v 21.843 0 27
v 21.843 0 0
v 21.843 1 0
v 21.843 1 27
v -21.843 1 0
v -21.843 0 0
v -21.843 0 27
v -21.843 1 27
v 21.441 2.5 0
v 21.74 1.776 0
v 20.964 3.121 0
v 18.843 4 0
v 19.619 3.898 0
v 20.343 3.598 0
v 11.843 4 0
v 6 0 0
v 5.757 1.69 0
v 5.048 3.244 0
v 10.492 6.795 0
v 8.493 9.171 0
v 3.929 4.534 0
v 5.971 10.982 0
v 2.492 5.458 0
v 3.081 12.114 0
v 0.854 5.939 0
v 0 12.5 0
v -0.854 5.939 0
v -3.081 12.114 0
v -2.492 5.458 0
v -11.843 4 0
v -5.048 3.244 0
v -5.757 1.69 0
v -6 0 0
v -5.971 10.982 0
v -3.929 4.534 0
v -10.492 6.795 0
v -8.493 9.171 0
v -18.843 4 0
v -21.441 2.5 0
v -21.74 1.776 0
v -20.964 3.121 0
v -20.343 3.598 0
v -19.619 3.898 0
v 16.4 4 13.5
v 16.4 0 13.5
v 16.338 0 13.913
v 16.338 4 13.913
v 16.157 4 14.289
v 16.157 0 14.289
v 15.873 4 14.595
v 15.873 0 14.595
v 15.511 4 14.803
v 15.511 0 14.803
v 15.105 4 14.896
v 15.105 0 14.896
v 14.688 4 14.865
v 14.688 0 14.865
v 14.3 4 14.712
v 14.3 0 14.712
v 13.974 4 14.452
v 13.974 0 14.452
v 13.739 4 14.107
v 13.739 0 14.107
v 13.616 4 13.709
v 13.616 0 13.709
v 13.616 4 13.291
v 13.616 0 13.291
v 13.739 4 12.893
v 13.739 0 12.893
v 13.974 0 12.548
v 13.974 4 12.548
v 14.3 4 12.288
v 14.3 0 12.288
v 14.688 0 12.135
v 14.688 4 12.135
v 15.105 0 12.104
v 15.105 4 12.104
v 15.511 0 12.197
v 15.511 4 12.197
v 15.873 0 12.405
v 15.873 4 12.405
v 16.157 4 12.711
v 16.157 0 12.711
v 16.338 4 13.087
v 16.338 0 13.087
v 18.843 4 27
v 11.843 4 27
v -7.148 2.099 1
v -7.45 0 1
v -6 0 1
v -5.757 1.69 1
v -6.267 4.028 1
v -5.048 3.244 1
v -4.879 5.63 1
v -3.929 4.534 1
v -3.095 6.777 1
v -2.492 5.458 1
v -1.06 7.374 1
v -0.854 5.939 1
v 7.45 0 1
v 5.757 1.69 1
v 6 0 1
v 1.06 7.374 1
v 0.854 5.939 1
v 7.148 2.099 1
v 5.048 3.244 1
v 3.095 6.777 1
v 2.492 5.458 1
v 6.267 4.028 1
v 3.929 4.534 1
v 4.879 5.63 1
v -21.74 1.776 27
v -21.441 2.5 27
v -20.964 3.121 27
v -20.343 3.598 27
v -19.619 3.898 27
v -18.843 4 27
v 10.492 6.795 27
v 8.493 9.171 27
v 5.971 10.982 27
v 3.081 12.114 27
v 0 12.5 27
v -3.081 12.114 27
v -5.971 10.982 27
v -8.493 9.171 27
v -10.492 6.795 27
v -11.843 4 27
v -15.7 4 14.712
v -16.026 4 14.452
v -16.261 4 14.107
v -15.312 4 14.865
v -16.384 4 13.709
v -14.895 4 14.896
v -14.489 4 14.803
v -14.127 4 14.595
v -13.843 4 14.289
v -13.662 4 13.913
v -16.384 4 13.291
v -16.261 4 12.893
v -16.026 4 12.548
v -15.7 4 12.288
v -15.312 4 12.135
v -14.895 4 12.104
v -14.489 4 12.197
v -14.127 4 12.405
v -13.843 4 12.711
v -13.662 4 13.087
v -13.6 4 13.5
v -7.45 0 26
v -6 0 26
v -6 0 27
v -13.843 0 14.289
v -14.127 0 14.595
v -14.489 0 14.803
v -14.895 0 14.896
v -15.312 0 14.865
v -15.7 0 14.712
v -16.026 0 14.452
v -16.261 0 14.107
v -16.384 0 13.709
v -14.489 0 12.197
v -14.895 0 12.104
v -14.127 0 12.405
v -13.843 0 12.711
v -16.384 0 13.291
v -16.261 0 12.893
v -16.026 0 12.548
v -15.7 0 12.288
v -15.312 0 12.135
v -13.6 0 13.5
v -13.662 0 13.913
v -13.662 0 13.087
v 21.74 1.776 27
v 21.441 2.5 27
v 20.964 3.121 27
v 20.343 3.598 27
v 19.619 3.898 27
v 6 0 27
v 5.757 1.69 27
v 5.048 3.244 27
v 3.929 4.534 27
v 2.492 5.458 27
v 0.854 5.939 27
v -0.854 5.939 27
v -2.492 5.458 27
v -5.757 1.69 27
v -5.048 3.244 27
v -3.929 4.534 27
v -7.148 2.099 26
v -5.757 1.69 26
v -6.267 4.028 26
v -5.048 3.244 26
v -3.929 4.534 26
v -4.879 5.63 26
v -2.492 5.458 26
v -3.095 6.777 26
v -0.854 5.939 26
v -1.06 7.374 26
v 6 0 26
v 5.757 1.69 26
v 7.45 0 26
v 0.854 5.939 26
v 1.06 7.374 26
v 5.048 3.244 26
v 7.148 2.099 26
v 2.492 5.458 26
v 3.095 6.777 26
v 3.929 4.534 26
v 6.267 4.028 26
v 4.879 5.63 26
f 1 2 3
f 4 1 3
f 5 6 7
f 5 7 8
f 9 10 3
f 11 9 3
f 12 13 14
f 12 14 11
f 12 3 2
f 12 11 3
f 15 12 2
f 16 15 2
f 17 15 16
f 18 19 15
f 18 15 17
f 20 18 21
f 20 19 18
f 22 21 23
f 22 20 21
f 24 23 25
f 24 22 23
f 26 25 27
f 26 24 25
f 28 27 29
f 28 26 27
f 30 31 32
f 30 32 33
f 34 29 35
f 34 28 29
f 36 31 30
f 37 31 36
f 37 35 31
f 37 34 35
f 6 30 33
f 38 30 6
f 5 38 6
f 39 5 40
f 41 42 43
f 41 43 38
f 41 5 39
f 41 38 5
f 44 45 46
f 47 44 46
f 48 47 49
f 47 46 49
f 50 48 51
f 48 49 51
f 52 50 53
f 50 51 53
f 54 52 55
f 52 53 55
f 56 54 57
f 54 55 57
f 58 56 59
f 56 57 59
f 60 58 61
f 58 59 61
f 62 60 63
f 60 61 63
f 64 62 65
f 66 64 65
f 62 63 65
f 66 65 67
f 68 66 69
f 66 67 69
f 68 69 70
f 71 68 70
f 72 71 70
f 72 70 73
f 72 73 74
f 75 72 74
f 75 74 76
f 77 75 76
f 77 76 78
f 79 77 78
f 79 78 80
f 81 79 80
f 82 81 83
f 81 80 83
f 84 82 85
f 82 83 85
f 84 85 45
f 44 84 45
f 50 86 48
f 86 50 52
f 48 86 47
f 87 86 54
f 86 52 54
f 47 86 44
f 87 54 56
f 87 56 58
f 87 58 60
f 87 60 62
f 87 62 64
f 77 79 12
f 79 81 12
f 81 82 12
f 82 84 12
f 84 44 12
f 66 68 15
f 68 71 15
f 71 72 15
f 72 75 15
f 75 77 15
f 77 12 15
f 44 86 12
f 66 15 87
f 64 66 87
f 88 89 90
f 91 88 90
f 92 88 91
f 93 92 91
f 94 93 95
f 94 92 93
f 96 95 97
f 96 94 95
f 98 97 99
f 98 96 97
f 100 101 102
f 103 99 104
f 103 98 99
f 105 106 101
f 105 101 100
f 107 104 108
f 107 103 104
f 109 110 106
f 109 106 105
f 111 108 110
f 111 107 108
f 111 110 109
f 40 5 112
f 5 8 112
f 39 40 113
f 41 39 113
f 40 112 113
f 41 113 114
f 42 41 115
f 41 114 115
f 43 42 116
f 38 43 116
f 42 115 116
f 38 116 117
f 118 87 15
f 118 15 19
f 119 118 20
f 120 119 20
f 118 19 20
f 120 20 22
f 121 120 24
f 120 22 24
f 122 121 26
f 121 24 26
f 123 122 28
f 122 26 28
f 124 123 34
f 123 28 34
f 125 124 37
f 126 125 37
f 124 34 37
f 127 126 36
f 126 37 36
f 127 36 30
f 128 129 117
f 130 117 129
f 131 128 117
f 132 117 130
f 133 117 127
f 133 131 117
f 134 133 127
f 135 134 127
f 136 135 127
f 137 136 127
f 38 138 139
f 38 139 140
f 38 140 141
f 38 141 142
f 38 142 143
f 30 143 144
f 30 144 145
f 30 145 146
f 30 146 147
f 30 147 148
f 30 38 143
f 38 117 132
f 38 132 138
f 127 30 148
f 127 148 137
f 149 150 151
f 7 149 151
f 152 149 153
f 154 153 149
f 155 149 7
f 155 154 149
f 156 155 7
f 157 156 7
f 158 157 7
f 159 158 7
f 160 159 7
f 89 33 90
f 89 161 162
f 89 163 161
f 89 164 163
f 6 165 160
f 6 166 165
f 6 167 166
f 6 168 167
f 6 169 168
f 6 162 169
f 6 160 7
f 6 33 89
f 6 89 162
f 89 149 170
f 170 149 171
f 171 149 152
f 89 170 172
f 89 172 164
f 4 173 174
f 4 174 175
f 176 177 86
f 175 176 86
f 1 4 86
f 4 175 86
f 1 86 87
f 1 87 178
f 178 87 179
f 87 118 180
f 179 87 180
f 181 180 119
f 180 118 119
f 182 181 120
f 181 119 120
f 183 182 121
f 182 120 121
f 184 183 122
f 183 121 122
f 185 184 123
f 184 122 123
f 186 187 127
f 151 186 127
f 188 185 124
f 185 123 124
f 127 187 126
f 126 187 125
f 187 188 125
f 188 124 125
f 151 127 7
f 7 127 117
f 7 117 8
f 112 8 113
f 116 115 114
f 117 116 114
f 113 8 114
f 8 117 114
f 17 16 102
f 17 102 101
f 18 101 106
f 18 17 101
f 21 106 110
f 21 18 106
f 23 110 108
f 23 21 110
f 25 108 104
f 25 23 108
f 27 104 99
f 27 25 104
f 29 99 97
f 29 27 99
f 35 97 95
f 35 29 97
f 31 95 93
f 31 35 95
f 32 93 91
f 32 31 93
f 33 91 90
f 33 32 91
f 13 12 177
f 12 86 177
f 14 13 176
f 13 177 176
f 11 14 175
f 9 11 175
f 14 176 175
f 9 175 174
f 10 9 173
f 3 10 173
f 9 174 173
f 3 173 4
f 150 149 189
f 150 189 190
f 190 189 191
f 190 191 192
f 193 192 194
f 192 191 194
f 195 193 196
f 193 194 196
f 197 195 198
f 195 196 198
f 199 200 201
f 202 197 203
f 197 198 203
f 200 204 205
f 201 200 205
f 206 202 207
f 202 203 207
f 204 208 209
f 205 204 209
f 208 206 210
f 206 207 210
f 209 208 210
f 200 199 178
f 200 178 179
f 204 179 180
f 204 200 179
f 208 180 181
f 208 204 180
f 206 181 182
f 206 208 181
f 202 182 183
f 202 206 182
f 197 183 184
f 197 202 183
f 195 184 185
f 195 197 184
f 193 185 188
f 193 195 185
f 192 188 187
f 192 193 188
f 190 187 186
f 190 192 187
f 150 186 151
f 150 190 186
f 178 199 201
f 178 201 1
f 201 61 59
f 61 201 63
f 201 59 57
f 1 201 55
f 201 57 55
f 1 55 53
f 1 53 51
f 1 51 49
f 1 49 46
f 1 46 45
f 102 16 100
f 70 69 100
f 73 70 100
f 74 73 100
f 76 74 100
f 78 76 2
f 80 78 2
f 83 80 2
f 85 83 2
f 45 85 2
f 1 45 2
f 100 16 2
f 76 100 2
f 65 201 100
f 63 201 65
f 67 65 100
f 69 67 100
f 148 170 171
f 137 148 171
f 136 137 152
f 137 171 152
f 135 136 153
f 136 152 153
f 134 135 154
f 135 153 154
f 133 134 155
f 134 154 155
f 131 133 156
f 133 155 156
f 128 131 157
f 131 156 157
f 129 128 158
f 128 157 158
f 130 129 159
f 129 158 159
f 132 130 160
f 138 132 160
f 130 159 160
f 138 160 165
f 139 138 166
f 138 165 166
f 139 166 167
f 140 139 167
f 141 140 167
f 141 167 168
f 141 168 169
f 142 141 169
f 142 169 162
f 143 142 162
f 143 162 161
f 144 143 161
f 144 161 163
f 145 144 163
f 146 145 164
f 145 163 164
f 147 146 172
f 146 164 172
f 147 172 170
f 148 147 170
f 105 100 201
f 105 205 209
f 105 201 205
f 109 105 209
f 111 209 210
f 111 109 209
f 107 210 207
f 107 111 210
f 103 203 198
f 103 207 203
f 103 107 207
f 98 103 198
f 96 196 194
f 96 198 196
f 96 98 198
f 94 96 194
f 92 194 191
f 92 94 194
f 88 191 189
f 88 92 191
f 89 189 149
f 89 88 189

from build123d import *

# Parameters (mm, degrees)
SKETCH006_R  = 1.4
PAD004_DEPTH = 4
PAD_DEPTH    = 27
PAD001_DEPTH = 1
PAD003_DEPTH = 1
FILLET_R     = 3


with BuildPart() as mount:
    # Sketch006 → Pad004 (new body)
    with BuildSketch(Plane.XZ):
        with Locations((-15, 13.5)):
            Circle(SKETCH006_R)
        with Locations((15, 13.5)):
            Circle(SKETCH006_R)
    extrude(amount=-PAD004_DEPTH)


with BuildPart() as base:
    # Sketch → Pad (new body)
    with BuildSketch(Plane.XY):
        with BuildLine():
            ThreePointArc((7.45, 0), (0, 7.45), (-7.45, 0))
            Line((-7.45, 0), (-21.842719, 0))
            Line((-21.842719, 0), (-21.842719, 4))
            Line((-21.842719, 4), (-11.842719, 4))
            ThreePointArc((11.842719, 4), (0, 12.5), (-11.842719, 4))
            Line((21.842719, 4), (11.842719, 4))
            Line((21.842719, 0), (21.842719, 4))
            Line((7.45, 0), (21.842719, 0))
        make_face()
    extrude(amount=PAD_DEPTH)


with BuildPart() as bottomlip:
    # Sketch003 → Pad001 (new body)
    with BuildSketch(Plane.XY):
        with BuildLine():
            ThreePointArc((7.46, 0), (0, 7.46), (-7.46, 0))
            Line((-7.46, 0), (-6, 0))
            ThreePointArc((6, 0), (0, 6), (-6, 0))
            Line((7.46, 0), (6, 0))
        make_face()
    extrude(amount=PAD001_DEPTH)


with BuildPart() as fillet_body:
    # Sketch005 → Pad003 (new body)
    with BuildSketch(Plane.XY.offset(26)):
        with BuildLine():
            ThreePointArc((7.46, 0), (0, 7.46), (-7.46, 0))
            Line((-7.46, 0), (-6, 0))
            ThreePointArc((6, 0), (0, 6), (-6, 0))
            Line((7.46, 0), (6, 0))
        make_face()
    extrude(amount=PAD003_DEPTH)

    # Fusion: union Base, BottomLip
    add(base.part)
    add(bottomlip.part)

    # Cut: cut Mount
    add(mount.part, mode=Mode.SUBTRACT)

    # Fillet
    fillet_edges = [fillet_body.edges().sort_by_distance(p)[0] for p in [
        (21.842719, 4, 13.5),
        (-21.842719, 4, 13.5),
    ]]
    fillet(fillet_edges, radius=FILLET_R)


solid = fillet_body.part
